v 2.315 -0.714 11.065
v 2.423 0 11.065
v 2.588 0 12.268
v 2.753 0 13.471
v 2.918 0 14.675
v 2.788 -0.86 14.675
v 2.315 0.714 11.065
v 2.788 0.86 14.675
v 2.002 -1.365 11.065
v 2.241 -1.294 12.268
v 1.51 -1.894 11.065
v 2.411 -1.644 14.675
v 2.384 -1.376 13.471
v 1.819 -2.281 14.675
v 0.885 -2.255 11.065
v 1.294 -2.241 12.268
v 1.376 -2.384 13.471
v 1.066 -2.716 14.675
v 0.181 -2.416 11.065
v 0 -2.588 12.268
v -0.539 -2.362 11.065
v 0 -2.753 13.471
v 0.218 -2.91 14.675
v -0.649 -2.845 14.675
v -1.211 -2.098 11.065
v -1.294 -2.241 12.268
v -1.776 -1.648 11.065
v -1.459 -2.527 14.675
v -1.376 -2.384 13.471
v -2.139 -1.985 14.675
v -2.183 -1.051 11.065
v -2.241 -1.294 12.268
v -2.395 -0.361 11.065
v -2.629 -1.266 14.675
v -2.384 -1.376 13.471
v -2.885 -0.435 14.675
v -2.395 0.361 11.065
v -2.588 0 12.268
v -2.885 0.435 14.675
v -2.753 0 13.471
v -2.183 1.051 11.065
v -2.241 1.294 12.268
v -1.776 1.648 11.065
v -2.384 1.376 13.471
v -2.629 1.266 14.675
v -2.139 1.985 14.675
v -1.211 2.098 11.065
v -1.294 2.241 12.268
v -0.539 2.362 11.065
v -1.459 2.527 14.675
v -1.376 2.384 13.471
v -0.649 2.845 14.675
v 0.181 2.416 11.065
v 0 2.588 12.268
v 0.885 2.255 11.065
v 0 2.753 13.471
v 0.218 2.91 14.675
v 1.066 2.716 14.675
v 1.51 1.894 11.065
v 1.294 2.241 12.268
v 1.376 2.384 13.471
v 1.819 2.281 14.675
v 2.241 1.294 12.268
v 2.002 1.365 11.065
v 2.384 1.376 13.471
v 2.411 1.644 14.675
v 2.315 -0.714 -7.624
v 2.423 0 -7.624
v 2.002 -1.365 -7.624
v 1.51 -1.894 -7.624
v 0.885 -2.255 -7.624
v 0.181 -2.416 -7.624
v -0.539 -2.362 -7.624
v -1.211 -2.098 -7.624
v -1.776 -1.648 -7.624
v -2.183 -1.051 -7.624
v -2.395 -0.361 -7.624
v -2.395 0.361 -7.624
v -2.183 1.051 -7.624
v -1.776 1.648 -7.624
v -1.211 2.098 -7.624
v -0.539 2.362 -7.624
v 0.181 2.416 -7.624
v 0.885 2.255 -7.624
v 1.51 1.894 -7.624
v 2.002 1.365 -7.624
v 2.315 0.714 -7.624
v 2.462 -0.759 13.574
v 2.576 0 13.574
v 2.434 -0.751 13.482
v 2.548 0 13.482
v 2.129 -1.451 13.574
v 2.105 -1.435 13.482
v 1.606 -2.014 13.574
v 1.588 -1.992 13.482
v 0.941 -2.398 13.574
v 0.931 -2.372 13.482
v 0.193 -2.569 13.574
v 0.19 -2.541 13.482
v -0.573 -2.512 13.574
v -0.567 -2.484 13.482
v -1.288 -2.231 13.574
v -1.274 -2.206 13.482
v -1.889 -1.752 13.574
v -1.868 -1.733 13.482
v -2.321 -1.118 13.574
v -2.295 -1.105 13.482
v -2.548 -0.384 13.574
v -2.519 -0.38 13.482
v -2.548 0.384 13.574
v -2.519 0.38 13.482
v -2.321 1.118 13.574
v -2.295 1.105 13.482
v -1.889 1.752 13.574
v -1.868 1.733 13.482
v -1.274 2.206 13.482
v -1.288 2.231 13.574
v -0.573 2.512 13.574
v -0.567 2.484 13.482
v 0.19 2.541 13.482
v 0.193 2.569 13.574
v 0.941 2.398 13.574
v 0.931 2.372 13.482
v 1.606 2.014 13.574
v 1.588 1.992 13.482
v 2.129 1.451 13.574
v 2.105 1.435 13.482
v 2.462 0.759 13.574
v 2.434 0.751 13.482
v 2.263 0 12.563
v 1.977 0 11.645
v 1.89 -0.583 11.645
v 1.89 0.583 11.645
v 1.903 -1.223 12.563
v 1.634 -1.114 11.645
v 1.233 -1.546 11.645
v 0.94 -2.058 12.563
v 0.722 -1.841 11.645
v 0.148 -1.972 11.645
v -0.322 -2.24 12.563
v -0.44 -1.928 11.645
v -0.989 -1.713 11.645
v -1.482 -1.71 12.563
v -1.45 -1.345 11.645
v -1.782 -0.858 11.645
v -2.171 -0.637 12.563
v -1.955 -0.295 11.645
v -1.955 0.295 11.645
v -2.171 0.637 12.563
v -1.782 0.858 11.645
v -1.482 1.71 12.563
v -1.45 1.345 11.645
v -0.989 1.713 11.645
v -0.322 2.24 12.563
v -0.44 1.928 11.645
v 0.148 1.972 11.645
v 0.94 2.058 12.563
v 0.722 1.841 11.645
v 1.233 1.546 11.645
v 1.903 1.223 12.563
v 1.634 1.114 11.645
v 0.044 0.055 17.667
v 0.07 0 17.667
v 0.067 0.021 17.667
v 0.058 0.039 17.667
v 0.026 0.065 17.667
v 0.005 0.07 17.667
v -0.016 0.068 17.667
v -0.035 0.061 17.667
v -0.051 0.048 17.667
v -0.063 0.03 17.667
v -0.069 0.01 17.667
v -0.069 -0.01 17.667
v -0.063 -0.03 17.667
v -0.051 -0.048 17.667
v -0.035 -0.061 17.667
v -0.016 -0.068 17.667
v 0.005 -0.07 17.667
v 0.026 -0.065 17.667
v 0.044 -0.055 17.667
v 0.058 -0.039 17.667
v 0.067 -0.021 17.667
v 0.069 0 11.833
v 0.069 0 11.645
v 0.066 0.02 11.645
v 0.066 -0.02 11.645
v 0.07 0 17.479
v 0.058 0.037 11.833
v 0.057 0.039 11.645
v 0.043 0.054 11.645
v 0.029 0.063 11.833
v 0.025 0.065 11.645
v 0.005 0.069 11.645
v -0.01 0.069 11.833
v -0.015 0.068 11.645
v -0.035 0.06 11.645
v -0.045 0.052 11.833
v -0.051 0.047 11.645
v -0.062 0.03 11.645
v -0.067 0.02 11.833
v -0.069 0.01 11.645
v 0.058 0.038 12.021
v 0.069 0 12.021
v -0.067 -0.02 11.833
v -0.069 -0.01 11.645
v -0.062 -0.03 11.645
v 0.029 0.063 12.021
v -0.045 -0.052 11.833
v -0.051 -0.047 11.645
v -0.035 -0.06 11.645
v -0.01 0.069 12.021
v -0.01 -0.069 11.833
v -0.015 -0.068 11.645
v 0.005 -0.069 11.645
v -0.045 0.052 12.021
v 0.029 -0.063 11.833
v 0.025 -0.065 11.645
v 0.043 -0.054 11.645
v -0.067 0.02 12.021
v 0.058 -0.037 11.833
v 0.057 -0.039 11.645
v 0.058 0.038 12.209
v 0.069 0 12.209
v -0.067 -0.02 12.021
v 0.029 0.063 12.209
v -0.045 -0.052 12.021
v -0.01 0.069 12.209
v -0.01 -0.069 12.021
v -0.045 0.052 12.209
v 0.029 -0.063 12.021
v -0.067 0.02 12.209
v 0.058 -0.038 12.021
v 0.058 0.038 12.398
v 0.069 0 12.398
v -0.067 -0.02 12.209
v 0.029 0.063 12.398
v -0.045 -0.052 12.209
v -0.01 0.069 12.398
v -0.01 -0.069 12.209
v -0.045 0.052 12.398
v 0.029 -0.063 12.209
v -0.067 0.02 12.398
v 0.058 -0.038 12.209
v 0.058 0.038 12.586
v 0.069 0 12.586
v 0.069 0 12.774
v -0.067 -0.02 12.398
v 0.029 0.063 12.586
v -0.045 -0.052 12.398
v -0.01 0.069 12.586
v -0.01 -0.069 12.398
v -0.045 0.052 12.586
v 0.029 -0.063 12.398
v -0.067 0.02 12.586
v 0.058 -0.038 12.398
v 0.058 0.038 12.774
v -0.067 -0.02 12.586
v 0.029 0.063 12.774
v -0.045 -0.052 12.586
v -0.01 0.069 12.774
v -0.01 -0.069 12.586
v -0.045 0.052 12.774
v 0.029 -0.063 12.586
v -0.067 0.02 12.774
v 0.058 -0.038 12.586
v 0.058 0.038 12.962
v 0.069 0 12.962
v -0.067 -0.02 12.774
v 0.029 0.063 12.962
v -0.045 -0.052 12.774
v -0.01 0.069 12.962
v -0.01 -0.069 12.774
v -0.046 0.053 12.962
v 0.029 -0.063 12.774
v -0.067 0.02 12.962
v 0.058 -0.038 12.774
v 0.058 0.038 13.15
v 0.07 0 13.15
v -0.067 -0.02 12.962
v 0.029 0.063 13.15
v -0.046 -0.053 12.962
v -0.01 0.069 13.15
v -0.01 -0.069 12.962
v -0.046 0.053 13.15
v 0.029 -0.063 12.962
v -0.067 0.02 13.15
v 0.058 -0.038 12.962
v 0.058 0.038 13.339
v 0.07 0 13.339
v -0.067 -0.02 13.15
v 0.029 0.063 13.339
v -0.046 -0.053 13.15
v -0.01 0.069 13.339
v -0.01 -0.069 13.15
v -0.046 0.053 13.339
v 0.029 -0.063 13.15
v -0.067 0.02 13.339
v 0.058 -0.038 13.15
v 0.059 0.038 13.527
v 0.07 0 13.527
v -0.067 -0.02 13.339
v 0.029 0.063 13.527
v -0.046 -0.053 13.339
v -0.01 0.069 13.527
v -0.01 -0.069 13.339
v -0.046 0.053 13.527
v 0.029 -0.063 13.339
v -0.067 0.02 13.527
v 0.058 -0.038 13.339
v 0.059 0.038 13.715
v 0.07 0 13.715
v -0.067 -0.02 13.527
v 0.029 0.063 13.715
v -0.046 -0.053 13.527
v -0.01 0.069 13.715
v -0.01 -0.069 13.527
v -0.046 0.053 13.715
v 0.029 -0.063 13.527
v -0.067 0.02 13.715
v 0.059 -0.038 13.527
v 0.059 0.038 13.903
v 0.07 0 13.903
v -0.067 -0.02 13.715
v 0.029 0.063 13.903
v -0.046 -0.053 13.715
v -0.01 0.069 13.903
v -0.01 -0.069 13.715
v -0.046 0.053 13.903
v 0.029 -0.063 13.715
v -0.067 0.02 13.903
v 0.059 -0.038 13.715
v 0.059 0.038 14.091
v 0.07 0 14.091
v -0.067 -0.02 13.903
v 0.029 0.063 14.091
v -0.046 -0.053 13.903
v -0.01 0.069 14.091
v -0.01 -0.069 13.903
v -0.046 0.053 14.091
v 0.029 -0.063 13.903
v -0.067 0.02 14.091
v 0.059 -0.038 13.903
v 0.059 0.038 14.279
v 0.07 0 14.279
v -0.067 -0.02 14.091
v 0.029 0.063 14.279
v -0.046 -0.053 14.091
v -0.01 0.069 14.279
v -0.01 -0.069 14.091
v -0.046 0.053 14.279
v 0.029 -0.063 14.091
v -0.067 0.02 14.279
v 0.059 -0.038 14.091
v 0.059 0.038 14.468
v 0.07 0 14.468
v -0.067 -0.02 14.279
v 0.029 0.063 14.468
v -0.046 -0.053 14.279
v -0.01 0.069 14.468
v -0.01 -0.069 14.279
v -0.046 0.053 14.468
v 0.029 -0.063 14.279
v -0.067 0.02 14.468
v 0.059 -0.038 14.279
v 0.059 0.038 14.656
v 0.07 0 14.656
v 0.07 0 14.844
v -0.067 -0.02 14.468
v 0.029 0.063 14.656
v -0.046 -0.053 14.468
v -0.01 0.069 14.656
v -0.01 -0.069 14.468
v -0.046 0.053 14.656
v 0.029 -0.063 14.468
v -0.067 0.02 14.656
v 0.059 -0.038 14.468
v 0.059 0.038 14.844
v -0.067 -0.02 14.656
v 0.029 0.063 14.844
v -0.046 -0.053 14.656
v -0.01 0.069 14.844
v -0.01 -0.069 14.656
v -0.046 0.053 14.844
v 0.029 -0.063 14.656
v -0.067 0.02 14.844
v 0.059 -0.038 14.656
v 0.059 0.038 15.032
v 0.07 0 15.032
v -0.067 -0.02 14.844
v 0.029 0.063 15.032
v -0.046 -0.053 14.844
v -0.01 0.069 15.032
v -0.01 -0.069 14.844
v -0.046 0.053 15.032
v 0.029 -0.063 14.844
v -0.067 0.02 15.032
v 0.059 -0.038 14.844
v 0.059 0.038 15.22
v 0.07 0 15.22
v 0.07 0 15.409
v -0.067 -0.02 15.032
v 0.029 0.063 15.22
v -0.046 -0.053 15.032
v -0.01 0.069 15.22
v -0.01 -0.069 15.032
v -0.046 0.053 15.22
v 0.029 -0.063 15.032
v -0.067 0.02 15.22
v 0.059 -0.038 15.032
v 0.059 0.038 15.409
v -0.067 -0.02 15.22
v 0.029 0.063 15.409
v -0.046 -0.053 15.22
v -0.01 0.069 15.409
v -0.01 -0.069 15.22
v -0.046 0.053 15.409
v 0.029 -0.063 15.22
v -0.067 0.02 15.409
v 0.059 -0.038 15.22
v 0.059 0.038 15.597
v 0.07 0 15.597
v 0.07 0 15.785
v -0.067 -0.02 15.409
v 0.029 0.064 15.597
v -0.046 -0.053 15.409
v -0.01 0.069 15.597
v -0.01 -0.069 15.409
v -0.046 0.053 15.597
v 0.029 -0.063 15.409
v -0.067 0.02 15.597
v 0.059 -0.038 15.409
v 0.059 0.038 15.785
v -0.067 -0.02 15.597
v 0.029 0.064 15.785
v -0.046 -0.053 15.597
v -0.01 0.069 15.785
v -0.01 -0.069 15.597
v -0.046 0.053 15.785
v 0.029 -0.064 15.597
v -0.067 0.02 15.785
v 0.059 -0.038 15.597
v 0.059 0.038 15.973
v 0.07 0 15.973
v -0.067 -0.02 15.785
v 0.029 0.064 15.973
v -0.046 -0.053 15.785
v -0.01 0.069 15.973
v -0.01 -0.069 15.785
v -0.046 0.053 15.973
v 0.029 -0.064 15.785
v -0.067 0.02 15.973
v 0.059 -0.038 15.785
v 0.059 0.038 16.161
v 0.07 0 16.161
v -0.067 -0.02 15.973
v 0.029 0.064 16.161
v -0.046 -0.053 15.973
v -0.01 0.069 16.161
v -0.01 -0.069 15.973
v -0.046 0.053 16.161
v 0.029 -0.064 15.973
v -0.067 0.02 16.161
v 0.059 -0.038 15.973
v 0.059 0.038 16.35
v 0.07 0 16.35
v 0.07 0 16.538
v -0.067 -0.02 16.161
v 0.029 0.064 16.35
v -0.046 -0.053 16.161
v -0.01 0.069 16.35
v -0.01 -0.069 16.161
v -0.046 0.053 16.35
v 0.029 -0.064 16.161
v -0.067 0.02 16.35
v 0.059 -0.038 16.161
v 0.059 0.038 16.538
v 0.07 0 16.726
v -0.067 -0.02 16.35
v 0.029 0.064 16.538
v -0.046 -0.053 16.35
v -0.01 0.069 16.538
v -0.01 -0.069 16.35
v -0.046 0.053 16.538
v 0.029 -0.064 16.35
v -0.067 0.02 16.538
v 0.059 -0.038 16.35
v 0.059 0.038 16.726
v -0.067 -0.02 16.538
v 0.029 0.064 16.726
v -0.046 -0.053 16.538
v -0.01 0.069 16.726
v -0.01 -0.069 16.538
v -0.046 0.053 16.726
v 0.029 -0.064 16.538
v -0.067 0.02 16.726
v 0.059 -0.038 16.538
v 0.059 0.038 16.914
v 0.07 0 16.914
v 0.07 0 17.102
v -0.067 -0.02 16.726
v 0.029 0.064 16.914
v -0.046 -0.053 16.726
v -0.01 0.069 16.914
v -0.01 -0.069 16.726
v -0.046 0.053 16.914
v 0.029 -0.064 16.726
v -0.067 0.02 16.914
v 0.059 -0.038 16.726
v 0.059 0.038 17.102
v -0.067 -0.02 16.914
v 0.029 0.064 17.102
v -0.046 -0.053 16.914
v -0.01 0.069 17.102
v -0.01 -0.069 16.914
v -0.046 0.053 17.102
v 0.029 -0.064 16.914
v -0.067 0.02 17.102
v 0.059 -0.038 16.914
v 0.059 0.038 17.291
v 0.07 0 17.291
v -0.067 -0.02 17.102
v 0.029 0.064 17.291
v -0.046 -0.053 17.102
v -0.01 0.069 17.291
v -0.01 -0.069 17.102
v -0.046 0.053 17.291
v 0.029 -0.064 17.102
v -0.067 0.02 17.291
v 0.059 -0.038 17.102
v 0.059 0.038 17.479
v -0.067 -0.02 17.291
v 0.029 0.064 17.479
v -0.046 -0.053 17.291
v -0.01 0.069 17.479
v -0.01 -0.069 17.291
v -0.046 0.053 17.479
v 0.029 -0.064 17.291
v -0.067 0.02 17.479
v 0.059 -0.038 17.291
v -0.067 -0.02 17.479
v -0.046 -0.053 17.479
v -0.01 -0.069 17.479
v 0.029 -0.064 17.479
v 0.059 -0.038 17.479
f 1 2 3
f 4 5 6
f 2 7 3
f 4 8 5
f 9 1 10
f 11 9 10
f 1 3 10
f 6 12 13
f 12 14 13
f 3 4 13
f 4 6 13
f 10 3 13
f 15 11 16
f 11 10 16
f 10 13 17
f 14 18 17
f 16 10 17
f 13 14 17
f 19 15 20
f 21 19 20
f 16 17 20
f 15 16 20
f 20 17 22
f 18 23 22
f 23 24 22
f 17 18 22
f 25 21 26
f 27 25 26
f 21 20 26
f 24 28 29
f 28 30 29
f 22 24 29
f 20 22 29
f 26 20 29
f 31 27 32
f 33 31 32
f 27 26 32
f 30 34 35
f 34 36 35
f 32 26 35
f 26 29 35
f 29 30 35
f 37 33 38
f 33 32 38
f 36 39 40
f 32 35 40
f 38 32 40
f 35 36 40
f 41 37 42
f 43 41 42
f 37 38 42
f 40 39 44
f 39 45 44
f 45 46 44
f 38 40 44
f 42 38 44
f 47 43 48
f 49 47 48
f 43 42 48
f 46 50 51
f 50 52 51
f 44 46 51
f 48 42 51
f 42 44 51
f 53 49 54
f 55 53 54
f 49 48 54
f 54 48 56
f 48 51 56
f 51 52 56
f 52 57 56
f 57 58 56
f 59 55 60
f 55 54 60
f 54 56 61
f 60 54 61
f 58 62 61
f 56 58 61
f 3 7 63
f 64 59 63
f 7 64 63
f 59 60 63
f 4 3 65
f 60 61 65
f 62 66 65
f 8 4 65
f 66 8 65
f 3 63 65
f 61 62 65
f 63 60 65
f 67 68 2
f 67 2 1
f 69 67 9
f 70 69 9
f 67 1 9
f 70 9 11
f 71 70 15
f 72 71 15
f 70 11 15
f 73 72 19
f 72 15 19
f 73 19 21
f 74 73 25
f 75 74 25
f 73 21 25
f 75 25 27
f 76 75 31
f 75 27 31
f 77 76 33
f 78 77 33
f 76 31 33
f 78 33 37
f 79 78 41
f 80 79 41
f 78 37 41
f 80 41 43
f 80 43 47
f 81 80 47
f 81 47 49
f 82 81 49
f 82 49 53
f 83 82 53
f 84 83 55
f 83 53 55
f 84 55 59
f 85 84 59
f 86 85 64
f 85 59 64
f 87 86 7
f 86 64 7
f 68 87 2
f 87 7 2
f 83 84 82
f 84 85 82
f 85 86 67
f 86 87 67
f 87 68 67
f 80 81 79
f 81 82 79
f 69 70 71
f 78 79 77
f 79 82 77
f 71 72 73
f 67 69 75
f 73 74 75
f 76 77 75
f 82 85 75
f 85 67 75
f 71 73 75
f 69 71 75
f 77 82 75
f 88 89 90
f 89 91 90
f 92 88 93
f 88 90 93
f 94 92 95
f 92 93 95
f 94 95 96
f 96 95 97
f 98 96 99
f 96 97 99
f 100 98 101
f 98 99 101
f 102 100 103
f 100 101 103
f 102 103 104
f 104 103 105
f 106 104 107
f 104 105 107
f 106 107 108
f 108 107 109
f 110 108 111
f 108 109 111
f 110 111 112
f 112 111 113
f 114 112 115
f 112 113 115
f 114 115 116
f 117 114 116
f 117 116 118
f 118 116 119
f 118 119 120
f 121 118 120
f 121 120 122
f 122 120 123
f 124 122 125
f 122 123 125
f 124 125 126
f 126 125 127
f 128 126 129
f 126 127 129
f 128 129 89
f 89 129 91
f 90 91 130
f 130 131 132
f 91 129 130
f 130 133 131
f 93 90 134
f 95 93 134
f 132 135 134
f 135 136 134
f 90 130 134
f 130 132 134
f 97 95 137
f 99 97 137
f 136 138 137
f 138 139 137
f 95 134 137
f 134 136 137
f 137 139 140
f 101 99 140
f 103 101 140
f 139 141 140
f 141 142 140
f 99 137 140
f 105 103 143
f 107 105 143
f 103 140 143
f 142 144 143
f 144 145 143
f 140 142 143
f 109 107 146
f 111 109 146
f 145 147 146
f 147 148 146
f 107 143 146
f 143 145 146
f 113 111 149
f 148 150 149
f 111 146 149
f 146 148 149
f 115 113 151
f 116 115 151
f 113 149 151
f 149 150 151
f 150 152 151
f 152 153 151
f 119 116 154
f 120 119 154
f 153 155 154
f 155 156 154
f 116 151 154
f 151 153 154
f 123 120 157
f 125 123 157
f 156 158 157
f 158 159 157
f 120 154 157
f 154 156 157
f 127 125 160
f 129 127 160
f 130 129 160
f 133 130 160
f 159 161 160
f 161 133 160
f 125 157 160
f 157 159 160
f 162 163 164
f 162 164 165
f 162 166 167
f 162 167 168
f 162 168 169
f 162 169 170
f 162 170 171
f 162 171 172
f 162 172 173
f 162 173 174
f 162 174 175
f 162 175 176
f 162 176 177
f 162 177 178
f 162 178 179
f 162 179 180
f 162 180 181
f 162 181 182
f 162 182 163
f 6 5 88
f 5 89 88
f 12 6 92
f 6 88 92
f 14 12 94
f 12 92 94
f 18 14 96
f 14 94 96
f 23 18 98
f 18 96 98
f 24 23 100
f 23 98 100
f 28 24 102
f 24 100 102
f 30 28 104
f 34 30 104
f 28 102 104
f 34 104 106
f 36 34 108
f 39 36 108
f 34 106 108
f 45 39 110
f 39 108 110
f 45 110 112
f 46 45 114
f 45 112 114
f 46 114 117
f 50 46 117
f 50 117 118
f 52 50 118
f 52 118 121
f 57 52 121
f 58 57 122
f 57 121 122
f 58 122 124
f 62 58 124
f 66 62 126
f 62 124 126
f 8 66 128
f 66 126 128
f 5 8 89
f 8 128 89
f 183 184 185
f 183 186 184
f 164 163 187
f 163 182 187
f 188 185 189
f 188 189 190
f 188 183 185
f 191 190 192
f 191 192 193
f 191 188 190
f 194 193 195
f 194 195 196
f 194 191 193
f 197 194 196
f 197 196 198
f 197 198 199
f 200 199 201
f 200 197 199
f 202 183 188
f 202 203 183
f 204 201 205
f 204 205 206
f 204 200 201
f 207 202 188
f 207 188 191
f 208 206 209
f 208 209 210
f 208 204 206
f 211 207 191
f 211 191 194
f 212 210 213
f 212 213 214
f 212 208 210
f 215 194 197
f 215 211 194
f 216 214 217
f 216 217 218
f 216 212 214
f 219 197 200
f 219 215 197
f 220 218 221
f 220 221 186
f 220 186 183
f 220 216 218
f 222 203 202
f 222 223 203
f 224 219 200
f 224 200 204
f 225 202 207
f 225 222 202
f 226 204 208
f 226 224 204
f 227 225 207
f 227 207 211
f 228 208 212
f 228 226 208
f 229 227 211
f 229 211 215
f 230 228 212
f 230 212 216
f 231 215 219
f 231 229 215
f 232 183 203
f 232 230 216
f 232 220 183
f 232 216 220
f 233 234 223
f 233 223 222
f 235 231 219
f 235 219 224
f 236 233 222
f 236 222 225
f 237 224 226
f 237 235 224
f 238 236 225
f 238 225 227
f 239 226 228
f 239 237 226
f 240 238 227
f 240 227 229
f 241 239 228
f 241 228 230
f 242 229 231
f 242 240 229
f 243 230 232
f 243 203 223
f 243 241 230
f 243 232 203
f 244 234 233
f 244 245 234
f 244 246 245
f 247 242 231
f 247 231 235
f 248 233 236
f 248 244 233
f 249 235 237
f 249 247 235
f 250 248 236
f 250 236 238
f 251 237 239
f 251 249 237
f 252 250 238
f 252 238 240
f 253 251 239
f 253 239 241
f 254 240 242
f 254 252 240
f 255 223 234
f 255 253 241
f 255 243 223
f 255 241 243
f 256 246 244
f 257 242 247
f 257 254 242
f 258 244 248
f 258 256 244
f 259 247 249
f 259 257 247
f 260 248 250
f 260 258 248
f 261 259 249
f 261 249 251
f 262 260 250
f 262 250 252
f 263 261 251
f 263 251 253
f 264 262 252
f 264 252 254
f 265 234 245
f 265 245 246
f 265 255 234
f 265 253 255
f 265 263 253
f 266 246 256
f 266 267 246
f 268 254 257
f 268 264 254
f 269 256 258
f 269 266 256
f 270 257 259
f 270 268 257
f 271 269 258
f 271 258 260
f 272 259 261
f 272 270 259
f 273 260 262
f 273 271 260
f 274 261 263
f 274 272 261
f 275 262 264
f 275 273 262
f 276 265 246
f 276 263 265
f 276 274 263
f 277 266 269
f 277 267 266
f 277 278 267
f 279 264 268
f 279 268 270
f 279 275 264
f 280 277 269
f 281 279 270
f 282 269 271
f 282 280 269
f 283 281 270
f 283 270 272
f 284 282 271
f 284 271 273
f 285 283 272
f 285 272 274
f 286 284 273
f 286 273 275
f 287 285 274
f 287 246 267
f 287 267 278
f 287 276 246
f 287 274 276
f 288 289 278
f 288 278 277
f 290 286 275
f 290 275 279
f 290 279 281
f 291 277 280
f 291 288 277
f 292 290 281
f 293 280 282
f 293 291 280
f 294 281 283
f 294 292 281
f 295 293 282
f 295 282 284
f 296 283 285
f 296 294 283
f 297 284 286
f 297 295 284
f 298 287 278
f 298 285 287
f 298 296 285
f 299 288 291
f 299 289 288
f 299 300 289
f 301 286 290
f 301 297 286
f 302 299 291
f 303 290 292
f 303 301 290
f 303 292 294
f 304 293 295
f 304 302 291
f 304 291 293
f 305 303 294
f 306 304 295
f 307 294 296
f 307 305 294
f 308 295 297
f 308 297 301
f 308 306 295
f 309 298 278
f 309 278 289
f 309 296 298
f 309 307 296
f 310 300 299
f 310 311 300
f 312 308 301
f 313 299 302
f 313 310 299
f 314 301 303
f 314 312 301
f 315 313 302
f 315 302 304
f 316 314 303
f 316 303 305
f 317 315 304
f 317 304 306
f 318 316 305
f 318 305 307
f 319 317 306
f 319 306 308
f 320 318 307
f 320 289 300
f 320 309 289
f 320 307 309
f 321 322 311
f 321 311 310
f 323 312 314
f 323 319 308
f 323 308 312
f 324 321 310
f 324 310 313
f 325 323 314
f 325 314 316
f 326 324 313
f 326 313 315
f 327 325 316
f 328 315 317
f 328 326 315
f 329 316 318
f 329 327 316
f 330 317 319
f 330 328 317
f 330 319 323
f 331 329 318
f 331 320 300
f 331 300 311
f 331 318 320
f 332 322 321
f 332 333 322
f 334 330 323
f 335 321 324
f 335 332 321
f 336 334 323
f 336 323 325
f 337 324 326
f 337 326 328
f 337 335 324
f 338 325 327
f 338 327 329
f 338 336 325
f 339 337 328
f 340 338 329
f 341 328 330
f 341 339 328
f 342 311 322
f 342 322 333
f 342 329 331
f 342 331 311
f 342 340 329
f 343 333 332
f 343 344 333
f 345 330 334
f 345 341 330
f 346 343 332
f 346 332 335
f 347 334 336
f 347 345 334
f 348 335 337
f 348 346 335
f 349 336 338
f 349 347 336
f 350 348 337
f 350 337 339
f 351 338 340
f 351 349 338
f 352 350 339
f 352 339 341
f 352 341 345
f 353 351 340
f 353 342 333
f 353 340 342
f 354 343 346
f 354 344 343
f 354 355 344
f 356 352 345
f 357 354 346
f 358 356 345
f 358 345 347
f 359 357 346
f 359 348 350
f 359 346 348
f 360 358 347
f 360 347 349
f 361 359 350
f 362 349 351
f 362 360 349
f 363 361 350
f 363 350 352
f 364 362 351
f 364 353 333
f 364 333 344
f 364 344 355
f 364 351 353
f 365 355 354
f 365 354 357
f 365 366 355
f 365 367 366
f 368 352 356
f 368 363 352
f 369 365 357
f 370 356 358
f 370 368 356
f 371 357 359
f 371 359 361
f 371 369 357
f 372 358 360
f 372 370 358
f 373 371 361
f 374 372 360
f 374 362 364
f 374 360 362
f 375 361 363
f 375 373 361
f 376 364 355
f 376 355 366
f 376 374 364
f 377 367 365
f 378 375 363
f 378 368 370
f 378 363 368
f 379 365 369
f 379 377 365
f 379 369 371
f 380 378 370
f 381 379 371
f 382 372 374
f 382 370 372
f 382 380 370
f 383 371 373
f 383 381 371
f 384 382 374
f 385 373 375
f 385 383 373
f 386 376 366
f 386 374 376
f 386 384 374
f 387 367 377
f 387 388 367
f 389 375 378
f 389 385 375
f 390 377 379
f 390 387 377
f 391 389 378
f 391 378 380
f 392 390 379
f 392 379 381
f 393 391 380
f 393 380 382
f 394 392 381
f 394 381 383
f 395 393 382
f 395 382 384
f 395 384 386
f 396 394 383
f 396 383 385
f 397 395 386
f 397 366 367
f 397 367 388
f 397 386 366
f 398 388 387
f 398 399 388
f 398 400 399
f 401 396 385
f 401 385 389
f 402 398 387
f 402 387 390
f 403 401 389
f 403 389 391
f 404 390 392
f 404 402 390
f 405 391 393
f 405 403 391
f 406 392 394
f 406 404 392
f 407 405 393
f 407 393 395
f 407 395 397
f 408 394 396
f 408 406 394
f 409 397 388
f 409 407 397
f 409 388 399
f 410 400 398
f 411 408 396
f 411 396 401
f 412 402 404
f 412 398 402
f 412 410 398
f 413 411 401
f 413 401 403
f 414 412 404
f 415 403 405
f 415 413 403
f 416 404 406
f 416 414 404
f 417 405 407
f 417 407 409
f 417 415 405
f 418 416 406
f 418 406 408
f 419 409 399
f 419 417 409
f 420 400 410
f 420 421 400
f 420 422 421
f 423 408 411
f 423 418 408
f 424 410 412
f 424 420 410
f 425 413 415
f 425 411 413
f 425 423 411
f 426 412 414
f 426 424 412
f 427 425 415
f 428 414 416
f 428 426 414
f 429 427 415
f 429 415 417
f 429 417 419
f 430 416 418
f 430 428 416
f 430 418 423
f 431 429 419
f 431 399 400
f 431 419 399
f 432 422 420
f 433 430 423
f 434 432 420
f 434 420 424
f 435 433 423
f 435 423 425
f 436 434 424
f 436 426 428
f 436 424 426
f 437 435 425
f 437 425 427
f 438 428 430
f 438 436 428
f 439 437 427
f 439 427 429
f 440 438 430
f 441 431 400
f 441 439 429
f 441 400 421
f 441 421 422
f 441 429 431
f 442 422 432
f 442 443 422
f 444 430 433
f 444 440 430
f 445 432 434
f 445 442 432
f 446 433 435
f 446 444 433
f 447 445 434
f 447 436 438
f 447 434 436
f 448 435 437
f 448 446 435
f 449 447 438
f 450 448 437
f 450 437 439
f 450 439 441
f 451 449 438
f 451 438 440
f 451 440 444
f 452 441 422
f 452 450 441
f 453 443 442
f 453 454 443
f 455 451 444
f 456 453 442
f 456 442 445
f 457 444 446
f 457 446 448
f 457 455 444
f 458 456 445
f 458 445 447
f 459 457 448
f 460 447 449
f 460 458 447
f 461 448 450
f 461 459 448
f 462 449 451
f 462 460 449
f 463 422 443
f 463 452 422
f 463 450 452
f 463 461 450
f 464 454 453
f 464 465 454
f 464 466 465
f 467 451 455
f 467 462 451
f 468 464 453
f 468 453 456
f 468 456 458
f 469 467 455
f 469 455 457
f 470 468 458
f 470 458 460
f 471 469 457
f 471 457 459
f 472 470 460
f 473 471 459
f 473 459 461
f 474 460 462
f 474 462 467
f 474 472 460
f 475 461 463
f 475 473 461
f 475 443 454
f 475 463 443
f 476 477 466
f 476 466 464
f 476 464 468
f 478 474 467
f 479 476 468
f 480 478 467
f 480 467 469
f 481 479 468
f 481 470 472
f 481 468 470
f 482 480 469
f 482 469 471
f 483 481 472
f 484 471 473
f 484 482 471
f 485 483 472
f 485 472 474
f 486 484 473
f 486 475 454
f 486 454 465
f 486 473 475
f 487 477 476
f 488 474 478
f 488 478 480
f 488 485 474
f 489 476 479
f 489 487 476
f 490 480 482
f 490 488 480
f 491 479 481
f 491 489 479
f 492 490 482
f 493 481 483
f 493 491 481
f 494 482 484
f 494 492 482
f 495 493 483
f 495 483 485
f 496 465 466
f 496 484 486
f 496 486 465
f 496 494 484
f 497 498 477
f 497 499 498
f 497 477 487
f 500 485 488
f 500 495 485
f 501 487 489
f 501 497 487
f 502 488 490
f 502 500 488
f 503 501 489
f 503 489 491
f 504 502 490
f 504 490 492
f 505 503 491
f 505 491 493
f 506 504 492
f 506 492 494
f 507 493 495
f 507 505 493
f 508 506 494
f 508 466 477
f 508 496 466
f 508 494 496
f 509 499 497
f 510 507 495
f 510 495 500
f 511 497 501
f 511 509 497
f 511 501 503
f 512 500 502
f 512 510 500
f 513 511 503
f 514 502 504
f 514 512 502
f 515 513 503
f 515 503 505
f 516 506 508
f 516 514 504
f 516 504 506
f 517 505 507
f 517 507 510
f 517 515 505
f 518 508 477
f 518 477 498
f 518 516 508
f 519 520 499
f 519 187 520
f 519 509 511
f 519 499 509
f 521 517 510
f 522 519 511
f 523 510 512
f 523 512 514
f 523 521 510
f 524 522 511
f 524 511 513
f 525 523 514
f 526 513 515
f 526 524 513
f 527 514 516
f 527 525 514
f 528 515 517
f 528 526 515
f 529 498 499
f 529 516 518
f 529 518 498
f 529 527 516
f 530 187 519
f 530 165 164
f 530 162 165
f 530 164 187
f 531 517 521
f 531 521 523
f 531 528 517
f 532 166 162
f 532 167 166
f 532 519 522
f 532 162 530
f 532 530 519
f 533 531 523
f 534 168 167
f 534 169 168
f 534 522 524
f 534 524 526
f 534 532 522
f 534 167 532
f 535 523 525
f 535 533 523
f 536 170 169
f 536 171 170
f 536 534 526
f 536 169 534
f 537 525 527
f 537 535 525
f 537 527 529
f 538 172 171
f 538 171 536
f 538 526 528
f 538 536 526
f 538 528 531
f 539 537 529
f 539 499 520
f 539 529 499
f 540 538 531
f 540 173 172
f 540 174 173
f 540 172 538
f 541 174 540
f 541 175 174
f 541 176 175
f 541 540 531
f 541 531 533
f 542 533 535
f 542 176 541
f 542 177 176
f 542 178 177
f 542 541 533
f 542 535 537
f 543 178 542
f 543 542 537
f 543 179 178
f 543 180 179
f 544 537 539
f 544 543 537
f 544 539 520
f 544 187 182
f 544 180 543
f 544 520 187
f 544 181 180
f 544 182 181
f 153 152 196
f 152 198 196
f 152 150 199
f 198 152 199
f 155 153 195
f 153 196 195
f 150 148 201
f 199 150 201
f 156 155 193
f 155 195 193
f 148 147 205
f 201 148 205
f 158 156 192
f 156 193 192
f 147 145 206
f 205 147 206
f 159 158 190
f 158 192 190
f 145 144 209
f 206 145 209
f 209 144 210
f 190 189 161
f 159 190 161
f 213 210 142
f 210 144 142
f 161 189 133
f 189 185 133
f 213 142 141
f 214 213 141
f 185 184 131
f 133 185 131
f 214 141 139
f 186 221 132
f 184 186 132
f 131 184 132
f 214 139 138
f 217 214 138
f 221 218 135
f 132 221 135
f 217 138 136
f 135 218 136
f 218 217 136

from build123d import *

# Parameters (mm, degrees)
F0_W     = 8.9162653312
F0_H     = 68.7855742872
F5_R     = 0.2551301714
F3_R     = 0.2579924581
F7_SCALE = 0.2717


with BuildPart() as f1:
    # F0 (on Front) → F1 (revolve)
    with BuildSketch(Plane.XZ):
        Polygon((0, 42.8588315845), (0, 40.7245121896), (8.9162653312, 40.7245121896), (10.7394016028, 54.0099740028), (9.4826271558, 49.960937351), (9.3766475536, 49.6194955792), (7.2782151401, 42.8588315845), (2.2957634175, 42.8588315845), align=None)
        with Locations((4.4581326656, 6.331725046)):
            Rectangle(F0_W, F0_H)
    revolve(axis=Axis((0, 0, 41.791671887), (0, 0, -1)))

    # F5 (on offset) → F6 section 0
    with BuildSketch(Plane.XY.offset(42.8498)):
        Circle(F5_R)
    # F3 (on offset) → F6 section 1
    with BuildSketch(Plane.XY.offset(65.024)):
        Circle(F3_R)
    loft()


with BuildPart() as f1_1:
    # F7: moved
    add(f1.part.scale(F7_SCALE))


solid = f1_1.part
